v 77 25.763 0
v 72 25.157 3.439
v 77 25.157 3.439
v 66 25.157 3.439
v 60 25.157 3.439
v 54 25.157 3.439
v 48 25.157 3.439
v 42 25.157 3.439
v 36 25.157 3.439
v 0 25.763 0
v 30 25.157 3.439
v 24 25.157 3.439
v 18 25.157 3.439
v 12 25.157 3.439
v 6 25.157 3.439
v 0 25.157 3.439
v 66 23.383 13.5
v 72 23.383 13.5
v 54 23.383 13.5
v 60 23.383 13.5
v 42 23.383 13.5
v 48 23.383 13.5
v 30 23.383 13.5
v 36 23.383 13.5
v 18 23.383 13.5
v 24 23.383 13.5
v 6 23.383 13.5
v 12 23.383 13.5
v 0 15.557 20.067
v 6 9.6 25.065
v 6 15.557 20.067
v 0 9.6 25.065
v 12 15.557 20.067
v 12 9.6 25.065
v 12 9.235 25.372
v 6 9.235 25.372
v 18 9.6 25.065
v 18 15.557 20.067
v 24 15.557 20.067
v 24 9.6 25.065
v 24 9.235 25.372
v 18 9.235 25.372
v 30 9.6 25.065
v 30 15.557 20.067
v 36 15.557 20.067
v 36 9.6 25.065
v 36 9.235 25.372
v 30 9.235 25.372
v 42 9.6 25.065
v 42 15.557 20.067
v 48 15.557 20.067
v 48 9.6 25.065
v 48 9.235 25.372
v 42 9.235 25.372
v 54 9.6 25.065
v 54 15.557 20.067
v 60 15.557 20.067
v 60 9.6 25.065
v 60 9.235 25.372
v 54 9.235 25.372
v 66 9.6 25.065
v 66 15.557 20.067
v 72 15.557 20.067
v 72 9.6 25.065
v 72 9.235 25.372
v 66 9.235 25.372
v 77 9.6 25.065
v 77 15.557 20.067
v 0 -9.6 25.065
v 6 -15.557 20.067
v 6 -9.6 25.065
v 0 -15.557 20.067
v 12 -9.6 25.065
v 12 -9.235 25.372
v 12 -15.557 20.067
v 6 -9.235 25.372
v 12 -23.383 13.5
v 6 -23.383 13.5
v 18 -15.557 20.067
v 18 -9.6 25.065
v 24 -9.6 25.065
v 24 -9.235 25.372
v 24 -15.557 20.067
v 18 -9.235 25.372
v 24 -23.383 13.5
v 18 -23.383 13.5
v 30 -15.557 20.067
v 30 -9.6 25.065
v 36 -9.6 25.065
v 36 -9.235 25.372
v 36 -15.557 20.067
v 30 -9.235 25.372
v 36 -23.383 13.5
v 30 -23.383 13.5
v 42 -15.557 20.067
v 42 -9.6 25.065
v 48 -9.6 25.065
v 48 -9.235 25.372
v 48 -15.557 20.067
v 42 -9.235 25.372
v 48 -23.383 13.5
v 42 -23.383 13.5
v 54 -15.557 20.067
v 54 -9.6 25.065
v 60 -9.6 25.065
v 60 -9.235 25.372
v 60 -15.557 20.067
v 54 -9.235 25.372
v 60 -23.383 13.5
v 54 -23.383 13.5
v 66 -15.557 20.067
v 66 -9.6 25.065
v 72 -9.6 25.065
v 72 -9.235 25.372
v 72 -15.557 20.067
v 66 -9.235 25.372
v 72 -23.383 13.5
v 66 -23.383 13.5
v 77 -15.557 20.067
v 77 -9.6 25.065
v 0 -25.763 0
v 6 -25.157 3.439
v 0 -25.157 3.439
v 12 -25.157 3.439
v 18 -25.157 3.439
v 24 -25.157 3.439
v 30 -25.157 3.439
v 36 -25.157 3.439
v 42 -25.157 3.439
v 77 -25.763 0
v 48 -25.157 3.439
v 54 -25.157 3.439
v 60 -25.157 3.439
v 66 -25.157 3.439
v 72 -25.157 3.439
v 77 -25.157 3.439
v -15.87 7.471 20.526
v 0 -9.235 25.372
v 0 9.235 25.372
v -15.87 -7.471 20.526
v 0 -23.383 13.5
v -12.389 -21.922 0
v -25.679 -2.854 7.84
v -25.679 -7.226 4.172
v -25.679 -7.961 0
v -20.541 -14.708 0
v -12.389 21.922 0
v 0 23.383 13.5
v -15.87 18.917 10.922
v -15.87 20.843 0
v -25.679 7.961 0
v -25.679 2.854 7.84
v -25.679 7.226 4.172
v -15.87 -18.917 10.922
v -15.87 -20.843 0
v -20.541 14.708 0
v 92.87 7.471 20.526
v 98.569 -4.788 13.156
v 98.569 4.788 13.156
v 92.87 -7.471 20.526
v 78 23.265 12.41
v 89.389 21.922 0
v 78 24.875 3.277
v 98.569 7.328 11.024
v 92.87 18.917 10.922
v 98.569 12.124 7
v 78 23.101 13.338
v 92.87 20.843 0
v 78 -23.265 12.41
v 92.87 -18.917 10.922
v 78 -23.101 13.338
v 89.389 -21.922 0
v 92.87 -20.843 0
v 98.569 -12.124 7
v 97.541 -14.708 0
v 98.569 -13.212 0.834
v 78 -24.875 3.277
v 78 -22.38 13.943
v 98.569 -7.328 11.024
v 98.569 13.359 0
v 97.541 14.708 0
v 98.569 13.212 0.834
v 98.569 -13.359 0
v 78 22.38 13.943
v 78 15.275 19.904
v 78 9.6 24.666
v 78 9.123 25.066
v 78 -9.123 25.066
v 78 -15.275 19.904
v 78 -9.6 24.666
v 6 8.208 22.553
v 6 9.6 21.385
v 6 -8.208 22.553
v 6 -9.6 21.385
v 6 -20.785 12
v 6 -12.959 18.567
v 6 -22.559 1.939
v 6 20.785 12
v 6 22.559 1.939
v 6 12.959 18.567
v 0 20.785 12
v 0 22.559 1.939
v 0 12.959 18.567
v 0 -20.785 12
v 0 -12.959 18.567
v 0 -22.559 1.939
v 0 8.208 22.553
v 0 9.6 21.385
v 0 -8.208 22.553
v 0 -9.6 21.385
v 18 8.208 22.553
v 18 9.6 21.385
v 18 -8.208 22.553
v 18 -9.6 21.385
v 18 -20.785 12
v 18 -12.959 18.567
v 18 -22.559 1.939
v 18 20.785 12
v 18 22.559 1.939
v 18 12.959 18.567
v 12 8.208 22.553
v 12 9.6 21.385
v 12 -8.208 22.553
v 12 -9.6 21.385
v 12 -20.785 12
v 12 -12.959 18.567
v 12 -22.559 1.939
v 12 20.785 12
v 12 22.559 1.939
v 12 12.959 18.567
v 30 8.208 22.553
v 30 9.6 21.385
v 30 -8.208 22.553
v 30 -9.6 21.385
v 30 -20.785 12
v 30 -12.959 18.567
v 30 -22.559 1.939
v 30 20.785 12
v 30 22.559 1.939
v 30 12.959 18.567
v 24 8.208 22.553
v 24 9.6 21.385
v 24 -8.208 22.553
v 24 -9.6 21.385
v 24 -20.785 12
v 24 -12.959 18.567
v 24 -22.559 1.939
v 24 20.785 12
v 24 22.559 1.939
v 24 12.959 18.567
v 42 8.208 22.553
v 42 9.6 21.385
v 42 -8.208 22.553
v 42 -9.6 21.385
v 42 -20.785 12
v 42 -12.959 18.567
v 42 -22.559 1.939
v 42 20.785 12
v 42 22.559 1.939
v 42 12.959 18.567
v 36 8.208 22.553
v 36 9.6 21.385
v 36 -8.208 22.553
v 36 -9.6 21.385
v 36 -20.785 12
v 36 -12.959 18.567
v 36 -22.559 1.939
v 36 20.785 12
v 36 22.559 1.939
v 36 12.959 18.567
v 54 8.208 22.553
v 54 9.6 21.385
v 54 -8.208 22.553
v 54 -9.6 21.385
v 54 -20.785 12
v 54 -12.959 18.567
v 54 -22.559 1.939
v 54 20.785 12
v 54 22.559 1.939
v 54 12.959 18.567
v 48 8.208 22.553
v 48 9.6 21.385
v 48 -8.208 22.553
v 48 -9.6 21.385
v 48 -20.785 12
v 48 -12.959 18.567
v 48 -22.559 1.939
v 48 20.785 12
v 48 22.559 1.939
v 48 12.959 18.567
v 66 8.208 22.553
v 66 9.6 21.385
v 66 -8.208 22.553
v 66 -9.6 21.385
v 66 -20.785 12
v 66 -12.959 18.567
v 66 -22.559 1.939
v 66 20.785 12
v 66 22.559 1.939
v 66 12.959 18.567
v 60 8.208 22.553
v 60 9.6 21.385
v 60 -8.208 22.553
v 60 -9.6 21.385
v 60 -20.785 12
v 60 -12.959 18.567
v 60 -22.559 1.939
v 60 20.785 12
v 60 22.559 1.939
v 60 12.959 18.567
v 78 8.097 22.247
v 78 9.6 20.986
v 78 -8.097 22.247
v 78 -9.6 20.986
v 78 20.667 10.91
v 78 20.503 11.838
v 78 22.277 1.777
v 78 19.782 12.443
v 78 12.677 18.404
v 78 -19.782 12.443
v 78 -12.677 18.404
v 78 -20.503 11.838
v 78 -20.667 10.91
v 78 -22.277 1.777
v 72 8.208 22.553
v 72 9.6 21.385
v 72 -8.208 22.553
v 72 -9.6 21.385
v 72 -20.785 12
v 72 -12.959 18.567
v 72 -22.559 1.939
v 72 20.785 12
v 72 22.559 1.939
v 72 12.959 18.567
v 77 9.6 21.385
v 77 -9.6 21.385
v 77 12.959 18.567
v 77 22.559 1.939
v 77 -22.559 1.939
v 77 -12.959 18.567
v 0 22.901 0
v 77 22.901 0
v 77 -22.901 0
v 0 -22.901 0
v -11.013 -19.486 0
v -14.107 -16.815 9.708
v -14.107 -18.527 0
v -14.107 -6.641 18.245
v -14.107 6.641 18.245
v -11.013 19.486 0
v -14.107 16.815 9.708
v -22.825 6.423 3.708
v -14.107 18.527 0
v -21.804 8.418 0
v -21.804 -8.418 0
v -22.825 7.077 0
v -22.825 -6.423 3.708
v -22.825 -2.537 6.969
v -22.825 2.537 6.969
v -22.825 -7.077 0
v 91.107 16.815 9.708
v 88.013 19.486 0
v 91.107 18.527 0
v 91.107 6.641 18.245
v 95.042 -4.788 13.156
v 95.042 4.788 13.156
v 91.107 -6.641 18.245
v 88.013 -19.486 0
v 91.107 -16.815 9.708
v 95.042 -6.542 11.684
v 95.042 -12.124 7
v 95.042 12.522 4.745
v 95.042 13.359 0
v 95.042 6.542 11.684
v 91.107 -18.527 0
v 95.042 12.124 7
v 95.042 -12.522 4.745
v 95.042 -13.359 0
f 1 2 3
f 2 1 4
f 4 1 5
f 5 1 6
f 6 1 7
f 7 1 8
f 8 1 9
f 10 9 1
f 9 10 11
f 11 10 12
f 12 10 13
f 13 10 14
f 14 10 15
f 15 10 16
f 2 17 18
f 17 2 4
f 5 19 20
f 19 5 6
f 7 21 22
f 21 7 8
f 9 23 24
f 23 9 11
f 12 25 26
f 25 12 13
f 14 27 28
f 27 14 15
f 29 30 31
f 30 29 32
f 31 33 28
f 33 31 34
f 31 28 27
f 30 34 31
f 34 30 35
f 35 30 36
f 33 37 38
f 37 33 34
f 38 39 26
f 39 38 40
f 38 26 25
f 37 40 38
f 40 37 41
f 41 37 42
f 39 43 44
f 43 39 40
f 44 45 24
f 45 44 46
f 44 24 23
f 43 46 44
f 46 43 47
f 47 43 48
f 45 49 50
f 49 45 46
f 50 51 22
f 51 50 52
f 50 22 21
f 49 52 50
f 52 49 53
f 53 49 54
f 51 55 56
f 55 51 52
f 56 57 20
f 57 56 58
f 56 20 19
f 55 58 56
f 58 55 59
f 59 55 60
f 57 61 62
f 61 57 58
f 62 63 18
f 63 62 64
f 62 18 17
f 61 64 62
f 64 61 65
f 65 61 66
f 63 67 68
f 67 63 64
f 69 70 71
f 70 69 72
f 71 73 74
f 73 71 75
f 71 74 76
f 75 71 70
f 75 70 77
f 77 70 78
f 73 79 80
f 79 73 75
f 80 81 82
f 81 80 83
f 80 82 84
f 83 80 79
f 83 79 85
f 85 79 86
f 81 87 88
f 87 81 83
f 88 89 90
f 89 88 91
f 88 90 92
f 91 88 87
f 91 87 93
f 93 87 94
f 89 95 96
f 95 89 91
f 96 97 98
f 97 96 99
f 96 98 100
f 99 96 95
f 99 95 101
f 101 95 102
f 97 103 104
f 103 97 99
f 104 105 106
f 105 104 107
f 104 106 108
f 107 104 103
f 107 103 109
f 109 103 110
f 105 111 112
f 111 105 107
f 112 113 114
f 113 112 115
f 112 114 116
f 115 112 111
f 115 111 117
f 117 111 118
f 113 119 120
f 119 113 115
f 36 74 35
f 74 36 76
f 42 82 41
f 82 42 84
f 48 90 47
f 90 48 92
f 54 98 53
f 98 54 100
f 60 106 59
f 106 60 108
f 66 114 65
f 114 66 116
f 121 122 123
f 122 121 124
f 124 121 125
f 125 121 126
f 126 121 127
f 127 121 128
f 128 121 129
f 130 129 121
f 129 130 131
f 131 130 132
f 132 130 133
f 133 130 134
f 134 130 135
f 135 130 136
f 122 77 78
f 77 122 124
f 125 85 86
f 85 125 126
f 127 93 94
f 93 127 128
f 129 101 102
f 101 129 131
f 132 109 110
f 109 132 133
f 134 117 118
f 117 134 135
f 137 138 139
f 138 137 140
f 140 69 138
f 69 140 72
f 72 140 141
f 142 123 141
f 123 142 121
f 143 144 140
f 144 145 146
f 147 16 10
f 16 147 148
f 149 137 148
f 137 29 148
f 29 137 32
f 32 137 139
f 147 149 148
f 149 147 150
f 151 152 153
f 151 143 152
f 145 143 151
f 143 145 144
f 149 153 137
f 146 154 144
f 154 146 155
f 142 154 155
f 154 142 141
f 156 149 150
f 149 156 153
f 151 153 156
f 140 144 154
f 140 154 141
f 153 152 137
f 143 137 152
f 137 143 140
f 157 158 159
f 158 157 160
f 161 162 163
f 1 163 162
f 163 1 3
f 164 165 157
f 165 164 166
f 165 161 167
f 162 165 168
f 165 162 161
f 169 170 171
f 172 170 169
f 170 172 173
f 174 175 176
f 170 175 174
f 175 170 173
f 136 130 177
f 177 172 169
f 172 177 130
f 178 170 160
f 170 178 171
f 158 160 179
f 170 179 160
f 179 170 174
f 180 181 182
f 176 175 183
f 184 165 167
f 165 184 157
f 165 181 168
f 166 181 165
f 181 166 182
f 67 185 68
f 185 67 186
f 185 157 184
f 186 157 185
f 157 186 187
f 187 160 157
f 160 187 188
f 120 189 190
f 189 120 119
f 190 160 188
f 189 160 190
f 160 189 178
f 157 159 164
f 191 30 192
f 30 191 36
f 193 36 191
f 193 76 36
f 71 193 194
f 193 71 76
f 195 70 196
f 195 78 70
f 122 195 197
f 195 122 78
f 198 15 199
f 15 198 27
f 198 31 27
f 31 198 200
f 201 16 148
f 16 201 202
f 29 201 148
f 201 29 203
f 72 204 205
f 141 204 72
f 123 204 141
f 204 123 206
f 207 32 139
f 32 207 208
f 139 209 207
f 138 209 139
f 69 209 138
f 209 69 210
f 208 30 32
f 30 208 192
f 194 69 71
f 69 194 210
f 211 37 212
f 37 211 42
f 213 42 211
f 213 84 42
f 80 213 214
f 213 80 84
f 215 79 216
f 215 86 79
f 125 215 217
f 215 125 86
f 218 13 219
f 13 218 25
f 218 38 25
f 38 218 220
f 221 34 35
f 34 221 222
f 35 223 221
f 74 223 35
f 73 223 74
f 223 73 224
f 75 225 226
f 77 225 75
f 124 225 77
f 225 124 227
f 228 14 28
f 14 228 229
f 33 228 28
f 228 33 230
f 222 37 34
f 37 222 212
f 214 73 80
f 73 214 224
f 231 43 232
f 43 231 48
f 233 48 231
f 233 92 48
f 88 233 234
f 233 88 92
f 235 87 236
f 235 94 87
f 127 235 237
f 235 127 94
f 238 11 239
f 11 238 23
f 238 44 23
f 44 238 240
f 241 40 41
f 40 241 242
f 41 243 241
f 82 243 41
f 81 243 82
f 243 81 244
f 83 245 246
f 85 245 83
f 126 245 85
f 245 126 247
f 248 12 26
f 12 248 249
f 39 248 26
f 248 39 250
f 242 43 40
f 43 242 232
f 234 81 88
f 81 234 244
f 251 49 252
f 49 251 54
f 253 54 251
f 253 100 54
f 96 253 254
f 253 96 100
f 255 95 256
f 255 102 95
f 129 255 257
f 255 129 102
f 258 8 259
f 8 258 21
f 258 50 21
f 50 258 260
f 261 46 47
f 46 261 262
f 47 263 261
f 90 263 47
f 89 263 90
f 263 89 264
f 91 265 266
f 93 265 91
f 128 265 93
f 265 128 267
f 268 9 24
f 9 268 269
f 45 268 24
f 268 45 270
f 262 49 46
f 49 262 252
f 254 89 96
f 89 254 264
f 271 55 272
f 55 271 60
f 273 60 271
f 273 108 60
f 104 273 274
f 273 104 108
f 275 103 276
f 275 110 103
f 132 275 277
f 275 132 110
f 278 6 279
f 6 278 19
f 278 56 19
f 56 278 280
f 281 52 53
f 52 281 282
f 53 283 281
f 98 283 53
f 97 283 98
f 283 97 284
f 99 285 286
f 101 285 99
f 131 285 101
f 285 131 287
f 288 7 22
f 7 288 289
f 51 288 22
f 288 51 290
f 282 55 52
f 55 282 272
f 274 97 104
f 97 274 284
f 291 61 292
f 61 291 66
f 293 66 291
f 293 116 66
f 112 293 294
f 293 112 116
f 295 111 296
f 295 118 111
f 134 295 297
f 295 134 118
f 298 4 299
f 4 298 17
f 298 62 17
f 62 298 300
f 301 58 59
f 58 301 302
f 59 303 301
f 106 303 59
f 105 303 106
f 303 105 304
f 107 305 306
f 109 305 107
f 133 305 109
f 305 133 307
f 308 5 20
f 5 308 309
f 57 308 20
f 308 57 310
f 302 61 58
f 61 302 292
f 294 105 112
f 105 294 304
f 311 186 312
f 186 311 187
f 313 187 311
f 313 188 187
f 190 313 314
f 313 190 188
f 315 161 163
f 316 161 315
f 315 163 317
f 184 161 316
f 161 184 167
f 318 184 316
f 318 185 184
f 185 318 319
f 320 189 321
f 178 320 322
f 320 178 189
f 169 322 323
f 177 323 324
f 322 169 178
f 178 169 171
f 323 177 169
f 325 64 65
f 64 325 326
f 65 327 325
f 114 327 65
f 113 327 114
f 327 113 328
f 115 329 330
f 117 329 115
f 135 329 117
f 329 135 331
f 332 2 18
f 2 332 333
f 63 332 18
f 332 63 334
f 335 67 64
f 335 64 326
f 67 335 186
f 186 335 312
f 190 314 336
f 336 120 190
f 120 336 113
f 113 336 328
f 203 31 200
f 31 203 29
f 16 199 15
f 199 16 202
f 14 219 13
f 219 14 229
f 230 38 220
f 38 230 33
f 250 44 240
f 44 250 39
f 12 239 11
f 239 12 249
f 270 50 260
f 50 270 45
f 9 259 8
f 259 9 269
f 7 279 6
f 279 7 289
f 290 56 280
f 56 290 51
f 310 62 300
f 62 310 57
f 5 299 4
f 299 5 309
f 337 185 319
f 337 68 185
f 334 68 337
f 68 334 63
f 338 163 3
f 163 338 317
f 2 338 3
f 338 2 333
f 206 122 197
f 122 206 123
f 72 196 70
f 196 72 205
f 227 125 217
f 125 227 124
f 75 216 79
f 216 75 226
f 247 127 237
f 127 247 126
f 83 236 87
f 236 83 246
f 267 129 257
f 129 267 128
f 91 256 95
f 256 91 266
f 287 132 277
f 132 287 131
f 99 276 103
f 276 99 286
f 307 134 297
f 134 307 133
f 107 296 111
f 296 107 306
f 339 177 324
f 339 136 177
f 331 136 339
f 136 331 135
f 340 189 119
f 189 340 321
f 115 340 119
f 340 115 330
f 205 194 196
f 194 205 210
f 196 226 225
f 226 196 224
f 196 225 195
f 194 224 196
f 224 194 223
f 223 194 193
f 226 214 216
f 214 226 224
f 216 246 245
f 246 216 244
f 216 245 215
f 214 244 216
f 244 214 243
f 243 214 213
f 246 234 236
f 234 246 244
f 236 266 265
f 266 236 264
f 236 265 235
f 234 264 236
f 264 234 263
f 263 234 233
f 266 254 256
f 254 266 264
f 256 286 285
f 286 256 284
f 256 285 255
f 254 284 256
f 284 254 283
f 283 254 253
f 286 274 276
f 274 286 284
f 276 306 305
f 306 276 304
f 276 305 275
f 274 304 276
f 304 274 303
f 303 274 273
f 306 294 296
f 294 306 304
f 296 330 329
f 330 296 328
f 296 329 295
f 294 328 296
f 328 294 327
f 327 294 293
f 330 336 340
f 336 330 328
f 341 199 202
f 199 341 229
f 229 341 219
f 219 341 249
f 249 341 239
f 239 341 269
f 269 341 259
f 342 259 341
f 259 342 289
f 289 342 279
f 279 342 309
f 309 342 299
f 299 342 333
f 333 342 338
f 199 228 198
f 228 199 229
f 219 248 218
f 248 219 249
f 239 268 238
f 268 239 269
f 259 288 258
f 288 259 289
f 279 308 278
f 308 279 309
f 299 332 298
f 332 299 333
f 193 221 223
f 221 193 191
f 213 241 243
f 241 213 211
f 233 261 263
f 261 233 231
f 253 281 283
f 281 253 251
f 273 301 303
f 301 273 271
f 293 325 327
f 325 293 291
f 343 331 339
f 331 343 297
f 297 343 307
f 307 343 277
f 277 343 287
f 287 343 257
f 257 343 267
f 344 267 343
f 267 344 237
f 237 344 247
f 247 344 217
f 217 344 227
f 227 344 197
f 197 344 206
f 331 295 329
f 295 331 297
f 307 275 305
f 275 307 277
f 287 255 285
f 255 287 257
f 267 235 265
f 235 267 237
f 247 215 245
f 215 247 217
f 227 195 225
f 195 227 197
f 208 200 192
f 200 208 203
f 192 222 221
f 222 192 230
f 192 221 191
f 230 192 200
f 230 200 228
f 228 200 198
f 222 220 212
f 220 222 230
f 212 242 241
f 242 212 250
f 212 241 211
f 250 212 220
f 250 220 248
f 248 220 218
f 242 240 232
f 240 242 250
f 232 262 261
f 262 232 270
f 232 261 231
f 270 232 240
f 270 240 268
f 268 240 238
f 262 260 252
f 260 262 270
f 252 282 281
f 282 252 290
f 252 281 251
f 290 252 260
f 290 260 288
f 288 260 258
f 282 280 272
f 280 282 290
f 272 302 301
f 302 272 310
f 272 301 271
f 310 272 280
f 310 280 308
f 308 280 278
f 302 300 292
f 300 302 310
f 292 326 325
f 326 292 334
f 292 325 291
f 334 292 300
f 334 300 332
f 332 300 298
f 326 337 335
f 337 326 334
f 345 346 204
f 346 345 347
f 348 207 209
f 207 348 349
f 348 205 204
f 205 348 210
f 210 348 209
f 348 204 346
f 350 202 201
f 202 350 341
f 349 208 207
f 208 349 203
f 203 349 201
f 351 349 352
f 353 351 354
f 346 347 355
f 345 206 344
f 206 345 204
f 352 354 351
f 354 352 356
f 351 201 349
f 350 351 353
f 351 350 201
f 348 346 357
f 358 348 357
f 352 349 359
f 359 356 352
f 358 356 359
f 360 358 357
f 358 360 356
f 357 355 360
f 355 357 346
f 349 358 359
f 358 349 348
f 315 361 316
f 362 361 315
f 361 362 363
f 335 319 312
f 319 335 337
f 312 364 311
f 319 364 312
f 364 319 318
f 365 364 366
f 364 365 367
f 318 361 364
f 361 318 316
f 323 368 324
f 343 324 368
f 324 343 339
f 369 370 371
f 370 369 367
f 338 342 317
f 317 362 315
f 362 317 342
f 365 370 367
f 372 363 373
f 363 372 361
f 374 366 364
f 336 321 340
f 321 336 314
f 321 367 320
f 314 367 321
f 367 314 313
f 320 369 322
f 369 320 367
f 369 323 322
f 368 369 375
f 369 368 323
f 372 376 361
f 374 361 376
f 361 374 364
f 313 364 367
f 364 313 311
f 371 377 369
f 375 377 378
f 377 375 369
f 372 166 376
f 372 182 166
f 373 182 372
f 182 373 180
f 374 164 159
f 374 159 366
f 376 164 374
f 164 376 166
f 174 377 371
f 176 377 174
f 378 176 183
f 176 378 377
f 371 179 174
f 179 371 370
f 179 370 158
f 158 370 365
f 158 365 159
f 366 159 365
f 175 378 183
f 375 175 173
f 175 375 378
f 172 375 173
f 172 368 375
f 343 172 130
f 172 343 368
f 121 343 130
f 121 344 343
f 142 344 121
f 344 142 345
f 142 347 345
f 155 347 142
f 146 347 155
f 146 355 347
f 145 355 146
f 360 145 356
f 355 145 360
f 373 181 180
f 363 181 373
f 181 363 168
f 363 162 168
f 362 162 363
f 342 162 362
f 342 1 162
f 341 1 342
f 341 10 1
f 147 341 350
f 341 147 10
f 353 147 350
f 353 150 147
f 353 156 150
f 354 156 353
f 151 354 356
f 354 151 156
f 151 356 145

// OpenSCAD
// [FL_INDEX: keywords="openscad, 3d_parametric, Bandage_Cage_for_Cat_Leg, csg_solid" | COT="Parametric OpenSCAD design from 3DCodeverse"]
// Title: Bandage Cage for Cat Leg

inner_d   = 48;
inner_r   = inner_d/2;
inner_l   = 125;
leg_d     = 28;
leg_r     = leg_d/2;
thickness = 3;

huge = 500;

$fn=9;

module air_holes()
{
  // Air holes
  for(a = [0:120:240])
  {
    for(h = [0:thickness*4:(inner_l - (inner_r*2))])
    {
      translate([0,0,h])
      rotate([0,0,a])
      translate([-huge/2,-inner_r/2.5,0]) cube([huge, inner_r/1.25, thickness*2]);
    }
  }
}

difference()
{
rotate([0,90,0])
difference()
{
  union() 
  {
    cylinder(r=inner_r + thickness, h=inner_l - (inner_r*2));
    sphere(r=inner_r+thickness);
    translate([0,0,inner_l - (inner_r*2)]) sphere(r=inner_r+thickness);
  }

  air_holes();

  // Insides
  cylinder(r=inner_r, h=inner_l - (inner_r*2));
  sphere(r=inner_r);
  translate([0,0,inner_l - (inner_r*2)]) sphere(r=inner_r);

  // Leg hole
  cylinder(r=leg_r, h=huge);

  // Air holes
  //for(a = [0:120:360])
  //{
  //  rotate([0,0,a]) translate([0,0,(inner_l - (inner_r*2))/2])
  //    cube([thickness*2, huge, inner_l - (inner_r*2)], center=true);
  //}


}
translate([-huge/2,-huge/2,-huge]) cube([huge,huge,huge]);
}
